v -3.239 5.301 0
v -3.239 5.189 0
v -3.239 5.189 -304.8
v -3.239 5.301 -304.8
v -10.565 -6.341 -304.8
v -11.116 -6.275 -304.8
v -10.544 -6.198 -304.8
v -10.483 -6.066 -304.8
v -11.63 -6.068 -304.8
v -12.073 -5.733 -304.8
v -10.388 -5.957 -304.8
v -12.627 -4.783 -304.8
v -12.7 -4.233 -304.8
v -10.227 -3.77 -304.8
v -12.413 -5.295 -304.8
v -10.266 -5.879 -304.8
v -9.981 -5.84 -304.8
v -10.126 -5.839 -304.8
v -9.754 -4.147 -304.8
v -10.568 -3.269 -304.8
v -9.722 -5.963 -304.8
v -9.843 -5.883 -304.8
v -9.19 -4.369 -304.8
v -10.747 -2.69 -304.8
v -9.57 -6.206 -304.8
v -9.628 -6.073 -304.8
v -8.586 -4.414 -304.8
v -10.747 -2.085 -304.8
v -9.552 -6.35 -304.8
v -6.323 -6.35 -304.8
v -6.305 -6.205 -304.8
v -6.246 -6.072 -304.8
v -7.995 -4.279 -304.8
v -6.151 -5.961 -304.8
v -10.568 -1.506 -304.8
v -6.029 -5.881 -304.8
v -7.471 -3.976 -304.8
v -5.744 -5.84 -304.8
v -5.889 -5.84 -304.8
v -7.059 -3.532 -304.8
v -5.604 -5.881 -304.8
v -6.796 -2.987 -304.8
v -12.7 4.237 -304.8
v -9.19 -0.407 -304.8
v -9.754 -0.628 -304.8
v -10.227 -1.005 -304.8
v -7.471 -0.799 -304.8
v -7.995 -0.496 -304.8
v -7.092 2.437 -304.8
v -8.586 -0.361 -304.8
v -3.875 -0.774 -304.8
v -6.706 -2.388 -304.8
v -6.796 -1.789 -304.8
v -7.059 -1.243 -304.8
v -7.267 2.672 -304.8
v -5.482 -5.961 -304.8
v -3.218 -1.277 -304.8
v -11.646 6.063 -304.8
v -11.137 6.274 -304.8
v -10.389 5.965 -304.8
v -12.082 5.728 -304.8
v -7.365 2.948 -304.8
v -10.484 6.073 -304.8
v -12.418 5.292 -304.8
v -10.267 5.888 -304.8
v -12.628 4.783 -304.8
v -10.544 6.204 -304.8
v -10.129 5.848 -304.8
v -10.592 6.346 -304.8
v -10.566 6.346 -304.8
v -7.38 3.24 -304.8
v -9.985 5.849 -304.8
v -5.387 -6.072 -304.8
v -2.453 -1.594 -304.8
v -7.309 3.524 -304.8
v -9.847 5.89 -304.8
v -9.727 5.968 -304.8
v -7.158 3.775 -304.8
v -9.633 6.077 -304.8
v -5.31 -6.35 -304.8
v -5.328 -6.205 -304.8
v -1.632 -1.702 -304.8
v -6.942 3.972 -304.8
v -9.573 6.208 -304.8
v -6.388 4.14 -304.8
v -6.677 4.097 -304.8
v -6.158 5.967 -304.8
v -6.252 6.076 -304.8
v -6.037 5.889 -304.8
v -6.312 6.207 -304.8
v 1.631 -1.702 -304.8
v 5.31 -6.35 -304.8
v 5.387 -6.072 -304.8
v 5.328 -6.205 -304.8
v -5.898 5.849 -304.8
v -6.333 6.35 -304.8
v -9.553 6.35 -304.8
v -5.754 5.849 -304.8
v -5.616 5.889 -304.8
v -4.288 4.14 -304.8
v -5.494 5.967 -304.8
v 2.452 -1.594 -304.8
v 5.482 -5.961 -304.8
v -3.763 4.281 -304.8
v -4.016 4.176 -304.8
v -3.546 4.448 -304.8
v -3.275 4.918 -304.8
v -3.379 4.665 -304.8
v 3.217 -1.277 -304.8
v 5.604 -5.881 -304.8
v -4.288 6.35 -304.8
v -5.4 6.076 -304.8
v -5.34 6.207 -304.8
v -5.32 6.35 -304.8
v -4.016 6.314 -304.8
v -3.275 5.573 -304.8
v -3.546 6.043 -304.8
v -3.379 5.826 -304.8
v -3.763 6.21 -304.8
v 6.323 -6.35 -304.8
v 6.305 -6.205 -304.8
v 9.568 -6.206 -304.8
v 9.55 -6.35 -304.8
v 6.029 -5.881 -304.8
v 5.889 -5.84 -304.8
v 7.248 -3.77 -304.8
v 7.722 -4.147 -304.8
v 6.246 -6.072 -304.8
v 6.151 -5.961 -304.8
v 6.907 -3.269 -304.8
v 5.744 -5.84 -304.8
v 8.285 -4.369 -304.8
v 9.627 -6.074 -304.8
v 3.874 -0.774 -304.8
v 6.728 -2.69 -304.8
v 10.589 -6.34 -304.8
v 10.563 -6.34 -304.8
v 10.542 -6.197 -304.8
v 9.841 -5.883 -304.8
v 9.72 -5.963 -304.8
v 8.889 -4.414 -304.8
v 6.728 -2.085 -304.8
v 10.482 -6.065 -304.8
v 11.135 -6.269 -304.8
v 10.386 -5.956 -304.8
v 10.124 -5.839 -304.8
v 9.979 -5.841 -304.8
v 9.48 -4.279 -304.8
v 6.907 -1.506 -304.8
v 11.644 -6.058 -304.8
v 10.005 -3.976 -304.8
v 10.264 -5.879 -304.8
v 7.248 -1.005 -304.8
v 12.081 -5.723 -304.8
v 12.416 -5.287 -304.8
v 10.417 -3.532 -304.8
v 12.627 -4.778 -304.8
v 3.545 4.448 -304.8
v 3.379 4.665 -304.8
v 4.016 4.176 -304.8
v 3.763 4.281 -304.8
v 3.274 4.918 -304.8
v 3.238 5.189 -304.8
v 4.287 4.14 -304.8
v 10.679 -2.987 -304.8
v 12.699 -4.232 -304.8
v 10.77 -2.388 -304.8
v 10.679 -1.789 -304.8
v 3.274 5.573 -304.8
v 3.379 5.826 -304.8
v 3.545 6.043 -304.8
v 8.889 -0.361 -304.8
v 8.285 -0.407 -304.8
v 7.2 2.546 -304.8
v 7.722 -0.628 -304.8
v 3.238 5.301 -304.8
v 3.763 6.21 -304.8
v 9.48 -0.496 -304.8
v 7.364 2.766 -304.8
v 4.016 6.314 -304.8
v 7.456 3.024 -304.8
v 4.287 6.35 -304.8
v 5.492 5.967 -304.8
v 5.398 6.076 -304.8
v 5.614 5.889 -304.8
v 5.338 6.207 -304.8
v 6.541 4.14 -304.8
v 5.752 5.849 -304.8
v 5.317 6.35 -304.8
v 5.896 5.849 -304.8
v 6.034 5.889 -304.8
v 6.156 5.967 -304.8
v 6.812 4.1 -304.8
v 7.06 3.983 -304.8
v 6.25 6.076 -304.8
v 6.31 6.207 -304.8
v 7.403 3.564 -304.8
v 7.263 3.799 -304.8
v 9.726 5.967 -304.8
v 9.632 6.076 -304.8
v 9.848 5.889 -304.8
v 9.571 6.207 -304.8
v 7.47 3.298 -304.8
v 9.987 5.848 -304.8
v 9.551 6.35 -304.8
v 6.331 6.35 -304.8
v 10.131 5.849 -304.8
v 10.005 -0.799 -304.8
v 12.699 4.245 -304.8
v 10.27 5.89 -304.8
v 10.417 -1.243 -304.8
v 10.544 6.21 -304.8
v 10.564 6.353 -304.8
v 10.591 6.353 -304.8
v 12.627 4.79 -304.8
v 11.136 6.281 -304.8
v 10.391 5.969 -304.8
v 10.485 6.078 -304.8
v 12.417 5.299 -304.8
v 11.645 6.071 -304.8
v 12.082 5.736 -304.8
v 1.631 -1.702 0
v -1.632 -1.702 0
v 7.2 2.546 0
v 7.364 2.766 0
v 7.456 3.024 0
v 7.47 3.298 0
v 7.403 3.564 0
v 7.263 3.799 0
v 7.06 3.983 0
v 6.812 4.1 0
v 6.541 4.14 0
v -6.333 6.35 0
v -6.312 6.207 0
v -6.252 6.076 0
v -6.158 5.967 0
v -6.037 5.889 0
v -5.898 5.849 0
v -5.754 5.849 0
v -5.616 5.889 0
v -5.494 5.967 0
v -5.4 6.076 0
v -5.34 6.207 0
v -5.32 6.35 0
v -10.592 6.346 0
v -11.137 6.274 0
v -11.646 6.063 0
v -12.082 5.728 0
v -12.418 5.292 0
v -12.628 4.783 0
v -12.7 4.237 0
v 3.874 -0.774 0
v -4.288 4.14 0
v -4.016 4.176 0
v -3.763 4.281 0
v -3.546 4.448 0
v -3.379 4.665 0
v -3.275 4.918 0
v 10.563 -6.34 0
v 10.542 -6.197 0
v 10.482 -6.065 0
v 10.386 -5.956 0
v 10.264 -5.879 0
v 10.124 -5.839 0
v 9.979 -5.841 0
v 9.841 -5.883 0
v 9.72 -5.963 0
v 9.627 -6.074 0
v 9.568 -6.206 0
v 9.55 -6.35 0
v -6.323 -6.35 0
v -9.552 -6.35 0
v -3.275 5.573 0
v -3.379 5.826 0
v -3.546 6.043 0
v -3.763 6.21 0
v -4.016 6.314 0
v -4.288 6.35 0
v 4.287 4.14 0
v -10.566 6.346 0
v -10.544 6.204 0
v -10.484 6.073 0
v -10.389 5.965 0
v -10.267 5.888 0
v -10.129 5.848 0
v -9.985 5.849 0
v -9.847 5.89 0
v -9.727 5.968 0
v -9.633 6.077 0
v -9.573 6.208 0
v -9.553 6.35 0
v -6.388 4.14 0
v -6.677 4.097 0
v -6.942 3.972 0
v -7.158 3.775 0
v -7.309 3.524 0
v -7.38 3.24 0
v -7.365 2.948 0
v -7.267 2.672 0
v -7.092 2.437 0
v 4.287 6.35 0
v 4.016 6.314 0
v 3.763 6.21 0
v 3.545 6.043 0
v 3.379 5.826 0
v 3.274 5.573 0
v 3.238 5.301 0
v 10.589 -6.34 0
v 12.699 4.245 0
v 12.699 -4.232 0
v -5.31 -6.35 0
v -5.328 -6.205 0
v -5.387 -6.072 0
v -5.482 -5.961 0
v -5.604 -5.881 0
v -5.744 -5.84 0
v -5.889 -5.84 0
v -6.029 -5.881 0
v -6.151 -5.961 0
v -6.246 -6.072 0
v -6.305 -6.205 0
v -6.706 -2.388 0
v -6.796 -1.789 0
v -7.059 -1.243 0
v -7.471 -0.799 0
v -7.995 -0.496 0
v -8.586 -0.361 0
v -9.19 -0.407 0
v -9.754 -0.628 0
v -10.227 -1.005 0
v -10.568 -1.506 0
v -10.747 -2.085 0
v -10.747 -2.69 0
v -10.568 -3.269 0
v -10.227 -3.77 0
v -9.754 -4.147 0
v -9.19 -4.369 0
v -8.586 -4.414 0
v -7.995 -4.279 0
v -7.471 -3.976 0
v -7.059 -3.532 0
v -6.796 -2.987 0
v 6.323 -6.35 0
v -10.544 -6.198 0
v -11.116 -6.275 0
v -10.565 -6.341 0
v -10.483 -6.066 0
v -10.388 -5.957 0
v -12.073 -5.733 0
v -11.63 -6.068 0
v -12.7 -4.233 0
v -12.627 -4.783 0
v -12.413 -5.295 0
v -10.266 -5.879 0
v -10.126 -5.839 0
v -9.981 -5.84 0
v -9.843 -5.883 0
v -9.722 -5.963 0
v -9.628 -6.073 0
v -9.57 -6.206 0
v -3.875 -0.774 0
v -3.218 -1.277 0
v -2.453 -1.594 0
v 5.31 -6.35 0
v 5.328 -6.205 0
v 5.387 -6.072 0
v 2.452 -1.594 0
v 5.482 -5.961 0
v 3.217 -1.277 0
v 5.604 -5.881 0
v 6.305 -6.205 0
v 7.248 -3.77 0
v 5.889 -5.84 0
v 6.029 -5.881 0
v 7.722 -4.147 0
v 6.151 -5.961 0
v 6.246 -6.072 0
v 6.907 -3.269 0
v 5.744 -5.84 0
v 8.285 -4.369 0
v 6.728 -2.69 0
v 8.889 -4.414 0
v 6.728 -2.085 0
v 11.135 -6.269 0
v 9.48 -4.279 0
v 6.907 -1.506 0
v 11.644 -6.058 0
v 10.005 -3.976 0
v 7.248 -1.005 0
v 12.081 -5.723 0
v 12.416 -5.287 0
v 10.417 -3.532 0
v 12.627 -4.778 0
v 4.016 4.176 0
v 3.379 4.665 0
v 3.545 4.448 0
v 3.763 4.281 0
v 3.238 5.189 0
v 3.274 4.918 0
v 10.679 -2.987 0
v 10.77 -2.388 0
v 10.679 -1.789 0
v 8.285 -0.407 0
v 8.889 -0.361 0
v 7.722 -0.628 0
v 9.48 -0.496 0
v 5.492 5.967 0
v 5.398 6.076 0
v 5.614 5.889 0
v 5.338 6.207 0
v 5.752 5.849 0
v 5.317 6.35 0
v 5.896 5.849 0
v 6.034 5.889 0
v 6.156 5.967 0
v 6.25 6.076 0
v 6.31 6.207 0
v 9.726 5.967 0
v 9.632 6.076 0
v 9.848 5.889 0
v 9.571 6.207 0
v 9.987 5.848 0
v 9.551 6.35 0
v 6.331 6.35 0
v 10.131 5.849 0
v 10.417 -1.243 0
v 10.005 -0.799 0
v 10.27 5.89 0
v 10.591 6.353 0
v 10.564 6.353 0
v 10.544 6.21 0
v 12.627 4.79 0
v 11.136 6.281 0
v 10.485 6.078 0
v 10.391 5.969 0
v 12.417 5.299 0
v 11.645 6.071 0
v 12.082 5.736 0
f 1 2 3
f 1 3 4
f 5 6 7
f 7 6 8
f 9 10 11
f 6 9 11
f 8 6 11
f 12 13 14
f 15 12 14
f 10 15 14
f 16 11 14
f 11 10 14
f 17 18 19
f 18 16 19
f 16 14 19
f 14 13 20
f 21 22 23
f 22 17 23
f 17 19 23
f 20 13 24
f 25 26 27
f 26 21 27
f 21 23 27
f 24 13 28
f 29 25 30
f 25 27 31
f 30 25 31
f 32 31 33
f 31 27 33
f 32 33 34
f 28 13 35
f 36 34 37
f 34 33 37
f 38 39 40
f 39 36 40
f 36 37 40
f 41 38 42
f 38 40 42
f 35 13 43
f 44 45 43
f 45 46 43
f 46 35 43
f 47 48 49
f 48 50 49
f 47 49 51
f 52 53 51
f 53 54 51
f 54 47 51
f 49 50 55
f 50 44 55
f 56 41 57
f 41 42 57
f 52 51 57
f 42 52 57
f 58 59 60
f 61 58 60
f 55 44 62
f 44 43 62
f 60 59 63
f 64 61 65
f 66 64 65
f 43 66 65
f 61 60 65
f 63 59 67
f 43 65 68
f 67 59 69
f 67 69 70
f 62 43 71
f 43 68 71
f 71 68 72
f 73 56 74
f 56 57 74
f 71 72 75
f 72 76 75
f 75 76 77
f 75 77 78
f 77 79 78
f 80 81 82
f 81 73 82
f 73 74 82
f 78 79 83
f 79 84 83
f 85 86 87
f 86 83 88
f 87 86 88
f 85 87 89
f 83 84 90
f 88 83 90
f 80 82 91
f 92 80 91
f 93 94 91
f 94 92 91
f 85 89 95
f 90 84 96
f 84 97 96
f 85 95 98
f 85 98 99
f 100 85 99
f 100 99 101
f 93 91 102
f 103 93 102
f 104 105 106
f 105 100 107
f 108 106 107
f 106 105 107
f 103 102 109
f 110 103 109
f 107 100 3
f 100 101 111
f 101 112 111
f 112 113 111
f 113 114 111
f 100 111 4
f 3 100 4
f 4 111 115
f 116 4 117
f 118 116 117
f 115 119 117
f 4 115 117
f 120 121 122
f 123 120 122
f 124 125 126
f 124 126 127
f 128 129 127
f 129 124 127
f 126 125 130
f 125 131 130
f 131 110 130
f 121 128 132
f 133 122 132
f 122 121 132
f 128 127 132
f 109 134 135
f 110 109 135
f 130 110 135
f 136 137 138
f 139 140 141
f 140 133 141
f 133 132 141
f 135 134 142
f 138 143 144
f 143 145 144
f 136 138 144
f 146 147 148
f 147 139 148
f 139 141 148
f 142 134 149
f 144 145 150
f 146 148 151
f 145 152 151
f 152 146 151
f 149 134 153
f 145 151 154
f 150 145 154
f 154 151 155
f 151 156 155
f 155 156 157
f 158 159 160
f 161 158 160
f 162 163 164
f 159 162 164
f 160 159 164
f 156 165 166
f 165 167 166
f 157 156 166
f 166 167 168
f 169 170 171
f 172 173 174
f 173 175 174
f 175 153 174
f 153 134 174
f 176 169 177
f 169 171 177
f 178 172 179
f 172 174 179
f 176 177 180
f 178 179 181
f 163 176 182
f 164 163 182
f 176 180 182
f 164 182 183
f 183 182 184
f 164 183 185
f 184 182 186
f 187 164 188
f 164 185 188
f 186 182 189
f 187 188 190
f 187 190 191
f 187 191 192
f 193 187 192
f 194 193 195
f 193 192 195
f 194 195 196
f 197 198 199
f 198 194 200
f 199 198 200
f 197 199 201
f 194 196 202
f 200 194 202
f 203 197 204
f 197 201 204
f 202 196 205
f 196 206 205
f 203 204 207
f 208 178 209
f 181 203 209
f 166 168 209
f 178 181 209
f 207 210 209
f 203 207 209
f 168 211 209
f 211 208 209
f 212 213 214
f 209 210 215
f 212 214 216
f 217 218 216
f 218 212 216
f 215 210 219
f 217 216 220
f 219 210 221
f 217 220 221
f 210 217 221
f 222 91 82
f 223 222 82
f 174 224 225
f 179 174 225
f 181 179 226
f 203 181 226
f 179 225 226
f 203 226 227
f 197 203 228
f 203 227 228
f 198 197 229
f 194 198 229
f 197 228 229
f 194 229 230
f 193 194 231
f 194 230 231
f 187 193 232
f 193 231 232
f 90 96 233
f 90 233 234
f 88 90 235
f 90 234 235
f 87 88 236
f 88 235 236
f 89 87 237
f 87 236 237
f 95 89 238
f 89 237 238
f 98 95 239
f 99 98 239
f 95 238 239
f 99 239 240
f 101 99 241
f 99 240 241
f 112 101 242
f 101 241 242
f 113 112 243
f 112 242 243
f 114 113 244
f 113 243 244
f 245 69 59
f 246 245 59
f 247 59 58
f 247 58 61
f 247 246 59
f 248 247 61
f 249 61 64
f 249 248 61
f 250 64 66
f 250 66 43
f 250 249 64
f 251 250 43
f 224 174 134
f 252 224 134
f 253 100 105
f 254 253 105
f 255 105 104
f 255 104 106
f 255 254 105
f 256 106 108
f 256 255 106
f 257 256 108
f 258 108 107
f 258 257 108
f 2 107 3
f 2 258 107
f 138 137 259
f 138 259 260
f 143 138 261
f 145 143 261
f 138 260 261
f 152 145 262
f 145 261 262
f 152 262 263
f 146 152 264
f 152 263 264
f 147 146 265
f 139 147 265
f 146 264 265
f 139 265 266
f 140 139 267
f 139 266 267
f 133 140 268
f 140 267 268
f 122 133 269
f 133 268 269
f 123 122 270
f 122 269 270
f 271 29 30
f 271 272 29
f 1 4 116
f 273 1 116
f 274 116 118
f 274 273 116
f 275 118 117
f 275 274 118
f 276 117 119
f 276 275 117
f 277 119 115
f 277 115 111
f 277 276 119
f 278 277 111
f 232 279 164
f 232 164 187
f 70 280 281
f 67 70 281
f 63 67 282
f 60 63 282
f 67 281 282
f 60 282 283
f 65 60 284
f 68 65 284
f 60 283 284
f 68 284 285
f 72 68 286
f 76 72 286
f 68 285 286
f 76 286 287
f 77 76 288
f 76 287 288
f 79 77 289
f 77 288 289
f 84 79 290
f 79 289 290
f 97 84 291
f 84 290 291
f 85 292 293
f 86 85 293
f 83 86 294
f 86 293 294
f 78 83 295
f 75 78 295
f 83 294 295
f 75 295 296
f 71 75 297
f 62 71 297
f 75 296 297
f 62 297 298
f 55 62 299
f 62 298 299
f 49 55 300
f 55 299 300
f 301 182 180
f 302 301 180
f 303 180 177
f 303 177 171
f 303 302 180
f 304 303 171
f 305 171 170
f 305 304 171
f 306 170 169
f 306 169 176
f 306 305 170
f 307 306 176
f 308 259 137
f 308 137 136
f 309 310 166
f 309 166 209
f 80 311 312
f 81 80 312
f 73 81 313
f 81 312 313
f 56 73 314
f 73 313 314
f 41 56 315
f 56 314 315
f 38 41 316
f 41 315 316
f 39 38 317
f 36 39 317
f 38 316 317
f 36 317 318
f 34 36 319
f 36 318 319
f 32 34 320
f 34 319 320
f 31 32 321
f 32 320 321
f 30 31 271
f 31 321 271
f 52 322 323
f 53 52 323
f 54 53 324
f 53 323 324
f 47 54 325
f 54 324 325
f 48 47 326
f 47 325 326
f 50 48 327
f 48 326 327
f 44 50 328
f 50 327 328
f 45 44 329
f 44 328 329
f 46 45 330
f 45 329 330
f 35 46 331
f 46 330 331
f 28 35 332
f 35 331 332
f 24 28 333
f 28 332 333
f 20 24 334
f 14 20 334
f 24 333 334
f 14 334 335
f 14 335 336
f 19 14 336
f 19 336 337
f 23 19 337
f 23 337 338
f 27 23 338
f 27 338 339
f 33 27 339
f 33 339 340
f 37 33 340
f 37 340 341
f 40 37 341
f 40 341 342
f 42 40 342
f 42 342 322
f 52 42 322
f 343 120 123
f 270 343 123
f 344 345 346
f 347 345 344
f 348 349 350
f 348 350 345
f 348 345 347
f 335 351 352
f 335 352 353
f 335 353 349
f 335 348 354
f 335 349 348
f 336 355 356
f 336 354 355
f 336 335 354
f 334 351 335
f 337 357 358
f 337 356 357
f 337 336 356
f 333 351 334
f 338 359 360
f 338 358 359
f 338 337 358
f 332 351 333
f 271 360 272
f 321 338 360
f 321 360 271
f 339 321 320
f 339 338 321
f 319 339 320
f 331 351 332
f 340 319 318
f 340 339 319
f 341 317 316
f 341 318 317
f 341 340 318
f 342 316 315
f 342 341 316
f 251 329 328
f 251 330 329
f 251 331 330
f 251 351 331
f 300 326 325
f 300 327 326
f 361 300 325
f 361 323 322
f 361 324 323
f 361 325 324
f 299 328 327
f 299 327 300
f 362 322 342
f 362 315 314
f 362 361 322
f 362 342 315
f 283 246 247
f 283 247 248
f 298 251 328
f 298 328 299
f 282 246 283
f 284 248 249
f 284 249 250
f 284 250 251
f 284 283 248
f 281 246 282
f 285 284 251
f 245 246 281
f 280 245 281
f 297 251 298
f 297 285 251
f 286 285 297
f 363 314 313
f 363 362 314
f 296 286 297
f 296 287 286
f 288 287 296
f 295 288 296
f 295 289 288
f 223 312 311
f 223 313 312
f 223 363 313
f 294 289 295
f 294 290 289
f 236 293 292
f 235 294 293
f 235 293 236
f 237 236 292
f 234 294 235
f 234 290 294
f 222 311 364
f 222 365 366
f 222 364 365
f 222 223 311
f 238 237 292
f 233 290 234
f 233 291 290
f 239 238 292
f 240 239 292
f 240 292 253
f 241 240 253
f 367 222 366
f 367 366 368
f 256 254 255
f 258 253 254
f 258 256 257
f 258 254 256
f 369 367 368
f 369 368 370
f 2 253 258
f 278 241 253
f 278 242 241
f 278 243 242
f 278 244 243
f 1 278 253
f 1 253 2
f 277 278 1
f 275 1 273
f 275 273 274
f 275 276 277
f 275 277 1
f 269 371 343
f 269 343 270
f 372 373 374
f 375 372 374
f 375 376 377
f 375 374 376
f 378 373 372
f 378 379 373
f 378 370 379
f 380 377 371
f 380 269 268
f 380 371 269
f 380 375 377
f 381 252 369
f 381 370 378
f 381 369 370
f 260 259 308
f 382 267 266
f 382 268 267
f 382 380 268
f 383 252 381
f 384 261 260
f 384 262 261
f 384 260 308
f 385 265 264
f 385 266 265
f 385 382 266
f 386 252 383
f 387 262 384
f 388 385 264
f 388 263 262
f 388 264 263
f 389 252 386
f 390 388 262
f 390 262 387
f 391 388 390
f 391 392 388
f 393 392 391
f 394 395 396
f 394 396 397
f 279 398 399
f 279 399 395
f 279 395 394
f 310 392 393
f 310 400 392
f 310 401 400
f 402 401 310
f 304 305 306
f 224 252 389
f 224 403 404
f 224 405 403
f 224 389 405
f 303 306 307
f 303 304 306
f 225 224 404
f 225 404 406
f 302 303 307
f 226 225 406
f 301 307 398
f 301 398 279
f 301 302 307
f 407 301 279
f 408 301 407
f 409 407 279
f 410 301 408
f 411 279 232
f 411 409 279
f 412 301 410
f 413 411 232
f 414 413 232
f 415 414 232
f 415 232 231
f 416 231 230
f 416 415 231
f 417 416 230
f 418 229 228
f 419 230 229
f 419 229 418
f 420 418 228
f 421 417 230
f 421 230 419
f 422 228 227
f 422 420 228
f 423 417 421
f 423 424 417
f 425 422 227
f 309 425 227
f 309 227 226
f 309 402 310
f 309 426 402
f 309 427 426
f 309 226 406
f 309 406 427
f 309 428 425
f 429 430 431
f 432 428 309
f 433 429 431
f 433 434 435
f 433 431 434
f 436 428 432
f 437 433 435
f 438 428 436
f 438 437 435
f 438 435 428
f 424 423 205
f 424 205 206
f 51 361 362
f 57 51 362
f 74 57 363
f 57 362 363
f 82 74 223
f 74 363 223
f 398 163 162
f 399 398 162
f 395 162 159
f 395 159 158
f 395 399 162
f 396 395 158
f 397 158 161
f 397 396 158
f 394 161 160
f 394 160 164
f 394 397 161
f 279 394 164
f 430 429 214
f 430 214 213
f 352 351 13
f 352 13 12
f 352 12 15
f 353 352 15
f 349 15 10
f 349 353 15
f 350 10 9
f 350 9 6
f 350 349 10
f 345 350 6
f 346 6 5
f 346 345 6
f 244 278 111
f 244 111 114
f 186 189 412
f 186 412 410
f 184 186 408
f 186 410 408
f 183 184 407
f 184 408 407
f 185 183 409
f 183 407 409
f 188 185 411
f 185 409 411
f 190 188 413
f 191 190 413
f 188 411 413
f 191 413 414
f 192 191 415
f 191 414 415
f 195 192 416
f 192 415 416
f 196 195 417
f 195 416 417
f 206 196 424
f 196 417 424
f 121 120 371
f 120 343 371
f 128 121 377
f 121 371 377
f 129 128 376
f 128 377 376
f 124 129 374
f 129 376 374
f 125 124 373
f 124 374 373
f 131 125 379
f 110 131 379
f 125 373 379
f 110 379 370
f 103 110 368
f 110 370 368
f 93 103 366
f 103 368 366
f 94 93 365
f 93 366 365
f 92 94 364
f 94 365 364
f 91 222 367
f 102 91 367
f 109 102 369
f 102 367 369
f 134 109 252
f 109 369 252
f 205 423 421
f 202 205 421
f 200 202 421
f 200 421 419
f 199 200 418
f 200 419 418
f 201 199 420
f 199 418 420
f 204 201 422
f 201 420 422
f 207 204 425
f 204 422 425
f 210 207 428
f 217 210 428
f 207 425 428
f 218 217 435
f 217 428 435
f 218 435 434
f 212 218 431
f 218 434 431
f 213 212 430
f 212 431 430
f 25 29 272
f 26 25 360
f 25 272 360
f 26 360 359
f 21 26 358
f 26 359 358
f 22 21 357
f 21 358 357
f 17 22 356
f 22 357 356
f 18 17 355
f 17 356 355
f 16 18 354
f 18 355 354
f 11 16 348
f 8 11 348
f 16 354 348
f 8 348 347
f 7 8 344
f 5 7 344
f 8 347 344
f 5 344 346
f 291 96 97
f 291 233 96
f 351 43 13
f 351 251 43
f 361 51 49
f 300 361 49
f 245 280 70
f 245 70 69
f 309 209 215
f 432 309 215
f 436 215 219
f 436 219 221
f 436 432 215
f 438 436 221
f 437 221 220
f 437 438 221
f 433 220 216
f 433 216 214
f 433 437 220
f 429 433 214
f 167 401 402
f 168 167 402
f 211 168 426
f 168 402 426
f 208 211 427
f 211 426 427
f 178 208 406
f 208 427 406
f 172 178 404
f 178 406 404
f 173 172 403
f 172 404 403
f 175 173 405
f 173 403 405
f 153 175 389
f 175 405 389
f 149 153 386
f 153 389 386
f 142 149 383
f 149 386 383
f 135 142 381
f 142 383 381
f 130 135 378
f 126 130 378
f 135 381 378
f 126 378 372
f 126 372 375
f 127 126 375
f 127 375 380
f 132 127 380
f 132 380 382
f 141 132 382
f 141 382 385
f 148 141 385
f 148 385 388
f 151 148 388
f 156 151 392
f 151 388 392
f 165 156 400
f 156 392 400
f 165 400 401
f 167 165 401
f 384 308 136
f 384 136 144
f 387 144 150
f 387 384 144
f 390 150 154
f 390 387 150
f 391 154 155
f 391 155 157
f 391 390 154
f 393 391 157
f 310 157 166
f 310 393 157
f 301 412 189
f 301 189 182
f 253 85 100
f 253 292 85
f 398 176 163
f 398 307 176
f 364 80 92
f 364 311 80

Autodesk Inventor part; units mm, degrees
ref_plane "YZ Plane" through (0, 0, 0) normal (1, 0, 0) x (0, 1, 0)
ref_plane "XZ Plane" through (0, 0, 0) normal (0, 1, 0) x (-1, 0, 0)
ref_plane "XY Plane" through (0, 0, 0) normal (0, 0, 1) x (1, 0, 0)
sketch "Sketch1" plane through (0, 0, 0) normal (0, 0, 1) x (1, 0, 0)
  circle A0 centre (8.7376, -2.3876) radius 2.032
  circle A1 centre (-8.7376, -2.3876) radius 2.032
  arc A2 (9.5508, 6.3501) -> (10.564, 6.3532) centre (10.0574, 6.3501) ccw
  line L0 (9.5508, 6.3501) -> (6.3306, 6.3501)
  arc A3 (5.3174, 6.3501) -> (6.3306, 6.3501) centre (5.824, 6.3501) ccw
  line L1 (5.3174, 6.3501) -> (4.2872, 6.3501)
  arc A4 (4.2872, 6.3501) -> (3.2382, 5.3011) centre (4.2872, 5.3011) ccw
  line L2 (3.2382, 5.3011) -> (3.2382, 5.1893)
  arc A5 (3.2382, 5.1893) -> (4.2872, 4.1403) centre (4.2872, 5.1893) ccw
  line L3 (4.2872, 4.1403) -> (6.5409, 4.1403)
  arc A6 (7.2003, 2.5463) -> (6.5409, 4.1403) centre (6.5409, 3.2069) ccw
  line L4 (7.2003, 2.5463) -> (3.8742, -0.7738)
  arc A7 (1.6311, -1.7017) -> (3.8742, -0.7738) centre (1.6311, 1.4733) ccw
  line L5 (1.6311, -1.7017) -> (-1.6318, -1.7017)
  arc A8 (-3.8748, -0.7738) -> (-1.6318, -1.7017) centre (-1.6318, 1.4733) ccw
  line L6 (-3.8748, -0.7738) -> (-7.092, 2.4374)
  arc A9 (-6.3875, 4.1403) -> (-7.092, 2.4374) centre (-6.3875, 3.1432) ccw
  line L7 (-6.3875, 4.1403) -> (-4.2879, 4.1403)
  arc A10 (-4.2879, 4.1403) -> (-3.2388, 5.1893) centre (-4.2879, 5.1893) ccw
  line L8 (-3.2388, 5.1893) -> (-3.2388, 5.3011)
  arc A11 (-3.2388, 5.3011) -> (-4.2879, 6.3501) centre (-4.2879, 5.3011) ccw
  line L9 (-4.2879, 6.3501) -> (-5.3196, 6.3501)
  arc A12 (-6.3328, 6.3501) -> (-5.3196, 6.3501) centre (-5.8262, 6.3501) ccw
  line L10 (-6.3328, 6.3501) -> (-9.5528, 6.3501)
  arc A13 (-10.566, 6.3457) -> (-9.5528, 6.3501) centre (-10.0594, 6.3501) ccw
  line L11 (-10.566, 6.3457) -> (-10.5916, 6.3457)
  arc A14 (-10.5916, 6.3457) -> (-12.7, 4.2373) centre (-10.5916, 4.2373) ccw
  line L12 (-12.7, 4.2373) -> (-12.7, -4.2331)
  arc A15 (-12.7, -4.2331) -> (-10.5647, -6.3413) centre (-10.5916, -4.2331) ccw
  arc A16 (-9.5516, -6.35) -> (-10.5647, -6.3413) centre (-10.0581, -6.3412) ccw
  line L13 (-9.5516, -6.35) -> (-6.323, -6.35)
  arc A17 (-5.31, -6.35) -> (-6.323, -6.35) centre (-5.8165, -6.3412) ccw
  line L14 (-5.31, -6.35) -> (5.31, -6.35)
  arc A18 (6.323, -6.35) -> (5.31, -6.35) centre (5.8165, -6.3412) ccw
  line L15 (6.323, -6.35) -> (9.5502, -6.35)
  arc A19 (10.5633, -6.3403) -> (9.5502, -6.35) centre (10.0567, -6.3412) ccw
  line L16 (10.5633, -6.3403) -> (10.589, -6.3404)
  arc A20 (10.589, -6.3404) -> (12.6991, -4.2321) centre (10.5907, -4.2321) ccw
  line L17 (12.6991, -4.2321) -> (12.6991, 4.2448)
  arc A21 (12.6991, 4.2448) -> (10.5907, 6.3532) centre (10.5907, 4.2448) ccw
  line L18 (10.5907, 6.3532) -> (10.564, 6.3532)
  point P0 (0, 0)
extrude "Extrusion1" add sketch "Sketch1" against normal blind 304.8
properties part number "1050-BLACK-FB"
